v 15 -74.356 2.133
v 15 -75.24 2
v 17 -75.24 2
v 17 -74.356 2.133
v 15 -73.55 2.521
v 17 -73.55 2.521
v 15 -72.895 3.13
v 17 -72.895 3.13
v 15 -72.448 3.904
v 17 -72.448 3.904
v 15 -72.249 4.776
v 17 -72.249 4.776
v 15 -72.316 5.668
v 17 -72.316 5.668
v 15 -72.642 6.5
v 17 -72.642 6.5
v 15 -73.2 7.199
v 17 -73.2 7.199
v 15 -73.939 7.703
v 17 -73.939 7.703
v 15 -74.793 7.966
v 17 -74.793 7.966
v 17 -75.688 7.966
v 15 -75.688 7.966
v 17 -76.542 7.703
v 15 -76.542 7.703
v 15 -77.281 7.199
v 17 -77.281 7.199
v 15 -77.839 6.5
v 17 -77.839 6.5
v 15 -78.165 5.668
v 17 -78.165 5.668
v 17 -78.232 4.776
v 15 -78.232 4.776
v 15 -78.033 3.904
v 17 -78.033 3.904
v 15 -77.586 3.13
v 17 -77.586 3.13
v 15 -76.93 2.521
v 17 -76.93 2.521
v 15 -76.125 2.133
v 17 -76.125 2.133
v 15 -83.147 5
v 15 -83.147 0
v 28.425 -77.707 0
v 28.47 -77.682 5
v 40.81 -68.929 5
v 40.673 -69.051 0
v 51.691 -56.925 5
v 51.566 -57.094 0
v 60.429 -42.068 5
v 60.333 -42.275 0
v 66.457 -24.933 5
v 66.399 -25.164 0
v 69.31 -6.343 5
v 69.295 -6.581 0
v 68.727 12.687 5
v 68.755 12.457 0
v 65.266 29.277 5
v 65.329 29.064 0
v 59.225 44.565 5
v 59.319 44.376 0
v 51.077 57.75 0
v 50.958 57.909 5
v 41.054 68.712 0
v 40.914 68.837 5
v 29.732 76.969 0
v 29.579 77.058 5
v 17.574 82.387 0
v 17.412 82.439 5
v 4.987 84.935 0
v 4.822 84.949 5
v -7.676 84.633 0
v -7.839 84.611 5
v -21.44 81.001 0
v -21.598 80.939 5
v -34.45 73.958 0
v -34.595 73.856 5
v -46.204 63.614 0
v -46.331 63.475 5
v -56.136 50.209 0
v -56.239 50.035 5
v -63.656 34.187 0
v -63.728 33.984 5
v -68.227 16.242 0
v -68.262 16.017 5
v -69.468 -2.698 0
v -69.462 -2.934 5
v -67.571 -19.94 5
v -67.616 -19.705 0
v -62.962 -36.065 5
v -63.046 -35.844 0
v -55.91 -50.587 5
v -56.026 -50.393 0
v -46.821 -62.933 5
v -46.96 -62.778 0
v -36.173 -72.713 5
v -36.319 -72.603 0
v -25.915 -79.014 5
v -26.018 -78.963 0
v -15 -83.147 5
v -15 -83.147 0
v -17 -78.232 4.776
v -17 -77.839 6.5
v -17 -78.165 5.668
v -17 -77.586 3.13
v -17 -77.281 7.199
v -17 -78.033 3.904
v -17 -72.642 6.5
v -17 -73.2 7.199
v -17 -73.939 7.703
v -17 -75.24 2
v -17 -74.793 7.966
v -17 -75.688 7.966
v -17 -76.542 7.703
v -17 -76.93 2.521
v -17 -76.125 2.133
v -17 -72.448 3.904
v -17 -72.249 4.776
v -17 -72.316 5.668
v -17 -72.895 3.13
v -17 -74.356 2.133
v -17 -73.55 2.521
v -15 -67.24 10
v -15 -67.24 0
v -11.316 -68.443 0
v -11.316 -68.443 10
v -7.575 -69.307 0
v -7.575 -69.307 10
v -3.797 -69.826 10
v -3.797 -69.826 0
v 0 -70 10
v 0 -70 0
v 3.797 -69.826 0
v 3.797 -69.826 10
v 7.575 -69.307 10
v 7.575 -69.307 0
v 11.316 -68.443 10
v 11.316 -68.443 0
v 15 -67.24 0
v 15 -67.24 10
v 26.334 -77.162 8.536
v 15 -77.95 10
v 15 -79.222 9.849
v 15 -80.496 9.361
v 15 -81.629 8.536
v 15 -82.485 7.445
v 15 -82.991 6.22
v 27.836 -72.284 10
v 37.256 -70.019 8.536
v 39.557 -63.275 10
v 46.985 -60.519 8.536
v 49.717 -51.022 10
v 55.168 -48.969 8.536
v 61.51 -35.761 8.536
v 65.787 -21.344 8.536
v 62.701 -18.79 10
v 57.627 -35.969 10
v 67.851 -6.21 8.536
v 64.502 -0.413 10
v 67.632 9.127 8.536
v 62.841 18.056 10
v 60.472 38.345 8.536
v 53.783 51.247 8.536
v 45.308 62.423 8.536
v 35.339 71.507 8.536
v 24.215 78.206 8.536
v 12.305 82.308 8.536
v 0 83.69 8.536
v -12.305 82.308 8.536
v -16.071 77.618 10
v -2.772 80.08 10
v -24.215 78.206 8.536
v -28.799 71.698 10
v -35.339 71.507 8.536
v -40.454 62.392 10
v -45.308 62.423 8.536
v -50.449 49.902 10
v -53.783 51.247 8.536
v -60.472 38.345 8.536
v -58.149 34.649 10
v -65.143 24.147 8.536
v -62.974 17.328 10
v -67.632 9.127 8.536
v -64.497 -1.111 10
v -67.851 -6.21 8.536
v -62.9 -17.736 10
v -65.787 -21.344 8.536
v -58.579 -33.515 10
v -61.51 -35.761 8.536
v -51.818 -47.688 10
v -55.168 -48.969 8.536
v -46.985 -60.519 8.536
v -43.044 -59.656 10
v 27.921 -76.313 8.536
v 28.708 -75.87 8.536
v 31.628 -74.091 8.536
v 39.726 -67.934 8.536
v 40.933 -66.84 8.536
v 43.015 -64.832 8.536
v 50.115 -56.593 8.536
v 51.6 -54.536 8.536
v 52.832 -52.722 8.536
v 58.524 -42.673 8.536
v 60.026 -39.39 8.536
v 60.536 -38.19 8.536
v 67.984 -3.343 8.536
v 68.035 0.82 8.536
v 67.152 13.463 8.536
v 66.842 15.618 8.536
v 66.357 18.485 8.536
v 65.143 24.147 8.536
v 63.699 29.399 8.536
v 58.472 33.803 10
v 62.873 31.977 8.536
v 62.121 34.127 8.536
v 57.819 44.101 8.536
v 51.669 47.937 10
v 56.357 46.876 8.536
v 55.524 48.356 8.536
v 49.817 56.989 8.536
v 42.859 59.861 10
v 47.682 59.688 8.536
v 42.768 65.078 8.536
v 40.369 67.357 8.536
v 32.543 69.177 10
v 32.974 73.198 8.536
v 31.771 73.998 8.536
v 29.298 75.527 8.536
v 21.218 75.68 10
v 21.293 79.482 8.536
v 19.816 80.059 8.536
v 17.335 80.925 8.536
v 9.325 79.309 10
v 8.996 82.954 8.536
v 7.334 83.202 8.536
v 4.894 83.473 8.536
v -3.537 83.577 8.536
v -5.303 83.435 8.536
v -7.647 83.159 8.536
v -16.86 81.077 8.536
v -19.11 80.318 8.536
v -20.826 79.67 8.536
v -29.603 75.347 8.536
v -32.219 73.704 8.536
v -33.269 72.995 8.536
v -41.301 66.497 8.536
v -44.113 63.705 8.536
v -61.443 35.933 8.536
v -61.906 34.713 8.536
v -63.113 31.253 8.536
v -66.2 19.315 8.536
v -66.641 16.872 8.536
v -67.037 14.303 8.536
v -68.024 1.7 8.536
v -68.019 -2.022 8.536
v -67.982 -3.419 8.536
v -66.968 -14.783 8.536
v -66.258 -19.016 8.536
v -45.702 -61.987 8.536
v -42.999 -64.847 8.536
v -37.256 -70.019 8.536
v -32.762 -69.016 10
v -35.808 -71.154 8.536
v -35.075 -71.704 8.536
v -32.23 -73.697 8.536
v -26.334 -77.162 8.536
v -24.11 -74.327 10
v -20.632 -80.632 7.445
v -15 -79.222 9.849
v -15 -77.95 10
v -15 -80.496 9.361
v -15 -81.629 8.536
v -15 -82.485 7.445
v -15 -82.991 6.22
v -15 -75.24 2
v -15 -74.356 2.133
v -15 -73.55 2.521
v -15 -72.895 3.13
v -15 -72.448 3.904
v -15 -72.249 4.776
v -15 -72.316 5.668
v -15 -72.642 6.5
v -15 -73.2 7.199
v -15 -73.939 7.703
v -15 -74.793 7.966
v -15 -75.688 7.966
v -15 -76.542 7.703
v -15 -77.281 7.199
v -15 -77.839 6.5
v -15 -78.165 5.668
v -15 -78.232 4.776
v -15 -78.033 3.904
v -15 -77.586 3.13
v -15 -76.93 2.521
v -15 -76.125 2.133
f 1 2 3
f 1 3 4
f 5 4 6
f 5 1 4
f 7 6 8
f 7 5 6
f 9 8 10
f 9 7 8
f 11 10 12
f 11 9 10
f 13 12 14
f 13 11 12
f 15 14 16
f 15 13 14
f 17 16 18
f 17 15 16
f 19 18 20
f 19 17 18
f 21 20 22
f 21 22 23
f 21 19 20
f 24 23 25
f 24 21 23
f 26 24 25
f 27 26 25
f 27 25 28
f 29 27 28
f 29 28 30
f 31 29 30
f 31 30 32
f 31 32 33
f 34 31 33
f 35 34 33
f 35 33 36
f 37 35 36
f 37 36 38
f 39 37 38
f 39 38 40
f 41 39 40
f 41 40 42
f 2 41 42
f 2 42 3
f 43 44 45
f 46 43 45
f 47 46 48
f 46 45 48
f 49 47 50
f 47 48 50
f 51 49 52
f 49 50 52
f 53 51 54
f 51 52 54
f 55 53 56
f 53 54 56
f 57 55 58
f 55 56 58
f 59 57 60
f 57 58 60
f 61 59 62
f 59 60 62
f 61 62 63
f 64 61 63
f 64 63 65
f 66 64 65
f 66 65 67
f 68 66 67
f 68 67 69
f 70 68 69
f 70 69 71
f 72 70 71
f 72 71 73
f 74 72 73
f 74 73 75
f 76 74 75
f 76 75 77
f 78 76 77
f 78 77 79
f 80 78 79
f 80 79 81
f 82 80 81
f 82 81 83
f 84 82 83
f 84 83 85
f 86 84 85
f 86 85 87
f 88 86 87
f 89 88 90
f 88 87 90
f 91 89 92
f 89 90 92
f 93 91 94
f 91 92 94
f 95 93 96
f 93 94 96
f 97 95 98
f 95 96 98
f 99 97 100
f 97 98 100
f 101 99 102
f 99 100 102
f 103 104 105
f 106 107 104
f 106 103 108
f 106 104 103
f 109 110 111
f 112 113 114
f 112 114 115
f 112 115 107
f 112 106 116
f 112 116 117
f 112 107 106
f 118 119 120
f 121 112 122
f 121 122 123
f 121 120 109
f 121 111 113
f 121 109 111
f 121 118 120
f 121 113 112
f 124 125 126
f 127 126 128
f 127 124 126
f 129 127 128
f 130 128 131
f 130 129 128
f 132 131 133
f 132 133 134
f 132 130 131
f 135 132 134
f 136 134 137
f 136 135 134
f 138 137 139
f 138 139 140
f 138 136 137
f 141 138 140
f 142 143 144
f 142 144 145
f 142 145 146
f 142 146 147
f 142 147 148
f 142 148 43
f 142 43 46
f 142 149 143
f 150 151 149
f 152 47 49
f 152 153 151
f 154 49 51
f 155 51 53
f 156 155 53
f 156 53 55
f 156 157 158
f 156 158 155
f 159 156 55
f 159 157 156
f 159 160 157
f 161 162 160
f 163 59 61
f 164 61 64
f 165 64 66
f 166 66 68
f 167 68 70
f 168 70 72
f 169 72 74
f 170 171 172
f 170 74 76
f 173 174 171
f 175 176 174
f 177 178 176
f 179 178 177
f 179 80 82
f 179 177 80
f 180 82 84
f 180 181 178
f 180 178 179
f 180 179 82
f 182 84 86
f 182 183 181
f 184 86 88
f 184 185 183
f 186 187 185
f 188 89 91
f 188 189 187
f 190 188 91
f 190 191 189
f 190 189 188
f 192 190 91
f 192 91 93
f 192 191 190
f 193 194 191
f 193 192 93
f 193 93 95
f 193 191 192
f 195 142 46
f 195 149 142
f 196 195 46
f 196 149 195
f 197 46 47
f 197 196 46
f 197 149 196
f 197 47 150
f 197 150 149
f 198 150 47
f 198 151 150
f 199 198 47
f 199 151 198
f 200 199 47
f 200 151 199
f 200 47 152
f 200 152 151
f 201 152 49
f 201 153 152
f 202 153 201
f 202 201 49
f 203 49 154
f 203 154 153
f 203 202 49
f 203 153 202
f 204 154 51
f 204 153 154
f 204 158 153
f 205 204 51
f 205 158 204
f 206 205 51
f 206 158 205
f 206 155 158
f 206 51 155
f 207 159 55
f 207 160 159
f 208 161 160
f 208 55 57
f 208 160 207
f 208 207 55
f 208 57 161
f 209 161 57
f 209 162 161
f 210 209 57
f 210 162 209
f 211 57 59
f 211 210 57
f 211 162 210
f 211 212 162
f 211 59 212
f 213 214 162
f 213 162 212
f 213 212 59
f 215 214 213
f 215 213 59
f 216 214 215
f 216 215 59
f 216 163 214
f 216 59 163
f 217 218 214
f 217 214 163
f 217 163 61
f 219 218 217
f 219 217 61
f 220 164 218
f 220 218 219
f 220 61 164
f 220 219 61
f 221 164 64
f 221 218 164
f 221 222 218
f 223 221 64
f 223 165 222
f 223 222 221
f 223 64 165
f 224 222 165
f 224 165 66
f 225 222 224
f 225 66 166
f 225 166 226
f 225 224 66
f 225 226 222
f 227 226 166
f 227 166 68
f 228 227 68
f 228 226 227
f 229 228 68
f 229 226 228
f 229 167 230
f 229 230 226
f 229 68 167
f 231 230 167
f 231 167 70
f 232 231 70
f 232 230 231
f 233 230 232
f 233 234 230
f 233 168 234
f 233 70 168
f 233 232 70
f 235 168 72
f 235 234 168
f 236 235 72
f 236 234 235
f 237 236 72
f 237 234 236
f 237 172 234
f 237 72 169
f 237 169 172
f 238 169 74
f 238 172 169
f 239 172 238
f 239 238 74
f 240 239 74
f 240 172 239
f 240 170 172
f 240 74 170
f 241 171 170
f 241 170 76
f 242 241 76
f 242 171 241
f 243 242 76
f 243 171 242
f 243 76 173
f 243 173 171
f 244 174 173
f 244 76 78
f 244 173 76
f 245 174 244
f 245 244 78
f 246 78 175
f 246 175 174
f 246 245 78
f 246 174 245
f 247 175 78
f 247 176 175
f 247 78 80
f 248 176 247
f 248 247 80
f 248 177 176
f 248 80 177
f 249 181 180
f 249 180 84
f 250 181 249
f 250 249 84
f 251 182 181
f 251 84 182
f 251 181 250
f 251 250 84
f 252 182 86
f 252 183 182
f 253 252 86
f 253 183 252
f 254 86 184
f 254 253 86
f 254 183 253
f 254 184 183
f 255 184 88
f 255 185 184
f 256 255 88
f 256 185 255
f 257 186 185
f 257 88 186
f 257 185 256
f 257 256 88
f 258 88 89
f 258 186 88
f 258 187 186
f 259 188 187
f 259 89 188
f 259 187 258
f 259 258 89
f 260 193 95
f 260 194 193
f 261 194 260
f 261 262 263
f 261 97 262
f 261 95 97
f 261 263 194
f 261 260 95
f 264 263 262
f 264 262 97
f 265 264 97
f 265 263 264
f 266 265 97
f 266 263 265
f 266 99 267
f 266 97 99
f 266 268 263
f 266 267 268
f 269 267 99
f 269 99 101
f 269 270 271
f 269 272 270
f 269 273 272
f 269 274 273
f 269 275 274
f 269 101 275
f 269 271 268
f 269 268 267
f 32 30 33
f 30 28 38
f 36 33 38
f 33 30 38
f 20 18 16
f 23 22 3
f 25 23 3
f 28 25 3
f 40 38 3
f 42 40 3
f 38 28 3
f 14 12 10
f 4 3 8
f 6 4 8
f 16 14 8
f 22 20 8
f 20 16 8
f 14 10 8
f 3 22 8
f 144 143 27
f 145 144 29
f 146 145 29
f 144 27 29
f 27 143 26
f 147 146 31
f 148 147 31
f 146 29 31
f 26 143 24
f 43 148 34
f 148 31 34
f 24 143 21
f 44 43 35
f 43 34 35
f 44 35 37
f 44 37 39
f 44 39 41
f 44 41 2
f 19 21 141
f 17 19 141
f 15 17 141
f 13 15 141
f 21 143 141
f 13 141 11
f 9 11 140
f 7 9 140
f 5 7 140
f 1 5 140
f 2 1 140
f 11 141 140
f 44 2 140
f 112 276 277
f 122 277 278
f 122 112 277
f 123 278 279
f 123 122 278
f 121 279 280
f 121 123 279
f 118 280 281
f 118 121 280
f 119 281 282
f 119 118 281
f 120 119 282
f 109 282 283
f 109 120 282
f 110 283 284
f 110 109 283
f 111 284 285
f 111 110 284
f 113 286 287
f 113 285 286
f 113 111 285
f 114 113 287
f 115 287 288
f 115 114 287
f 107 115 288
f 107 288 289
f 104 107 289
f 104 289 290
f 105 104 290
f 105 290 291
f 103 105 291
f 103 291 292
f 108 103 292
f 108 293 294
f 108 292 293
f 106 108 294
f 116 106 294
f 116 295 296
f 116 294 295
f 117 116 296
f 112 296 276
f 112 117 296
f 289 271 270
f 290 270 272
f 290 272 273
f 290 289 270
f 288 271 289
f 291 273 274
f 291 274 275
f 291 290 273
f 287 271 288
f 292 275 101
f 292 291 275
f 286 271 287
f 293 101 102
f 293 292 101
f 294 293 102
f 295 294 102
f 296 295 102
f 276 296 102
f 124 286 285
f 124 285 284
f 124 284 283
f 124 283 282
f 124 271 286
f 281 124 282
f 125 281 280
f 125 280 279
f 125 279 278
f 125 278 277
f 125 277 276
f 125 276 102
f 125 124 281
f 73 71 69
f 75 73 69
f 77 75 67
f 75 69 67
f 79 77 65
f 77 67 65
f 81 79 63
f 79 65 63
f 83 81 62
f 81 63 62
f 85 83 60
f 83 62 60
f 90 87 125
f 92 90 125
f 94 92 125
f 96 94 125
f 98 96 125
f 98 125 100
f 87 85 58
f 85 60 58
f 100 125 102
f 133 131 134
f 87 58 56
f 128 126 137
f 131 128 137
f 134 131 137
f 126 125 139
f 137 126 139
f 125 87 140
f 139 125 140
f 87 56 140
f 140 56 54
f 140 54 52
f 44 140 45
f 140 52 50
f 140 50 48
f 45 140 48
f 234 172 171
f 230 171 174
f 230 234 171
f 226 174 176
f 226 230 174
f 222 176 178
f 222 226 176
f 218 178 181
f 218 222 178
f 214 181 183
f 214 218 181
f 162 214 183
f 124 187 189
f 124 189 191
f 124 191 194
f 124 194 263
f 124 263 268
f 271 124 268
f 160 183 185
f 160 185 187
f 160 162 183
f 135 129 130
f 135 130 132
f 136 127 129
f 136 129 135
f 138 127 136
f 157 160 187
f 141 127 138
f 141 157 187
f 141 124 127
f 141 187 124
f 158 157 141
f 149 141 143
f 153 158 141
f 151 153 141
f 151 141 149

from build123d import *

# Parameters (mm, degrees)
SKETCH2_RX              = 85.154239152
SKETCH2_RY              = 69.502968375
SKETCH2_RX_2            = 70
SKETCH2_RY_2            = 53.954429773
BOSS_EXTRUDE2_DEPTH     = 10
SKETCH5_W               = 30
SKETCH5_H               = 10
CUT_EXTRUDE4_DEPTH      = 198
SKETCH7_RX              = 70
SKETCH7_RY              = 53.954429773
BOSS_EXTRUDE4_DEPTH     = 10
FILLET3_R               = 5
CUT_EXTRUDE5_DEPTH      = 32
CUT_EXTRUDE5_DEPTH_BACK = 2
SKETCH8_R               = 3


with BuildPart() as part:
    # Sketch2 → Boss-Extrude2 (new body)
    with BuildSketch(Plane.XY):
        with Locations(Location((0, 0), (0, 0, -90))):
            Ellipse(SKETCH2_RX, SKETCH2_RY)
        with Locations(Location((0, 0), (0, 0, -90))):
            Ellipse(SKETCH2_RX_2, SKETCH2_RY_2, mode=Mode.SUBTRACT)
    extrude(amount=BOSS_EXTRUDE2_DEPTH)

    # Sketch5 → Cut-Extrude4 (cut)
    with BuildSketch(Plane(origin=(0, 0, 0), x_dir=(1, 0, 0), z_dir=(0, 1, 0))):
        with Locations((0, -5)):
            Rectangle(SKETCH5_W, SKETCH5_H)
    extrude(amount=-CUT_EXTRUDE4_DEPTH, mode=Mode.SUBTRACT)

    # Sketch7 → Boss-Extrude4 (add)
    with BuildSketch(Plane.XY.offset(10)):
        with Locations(Location((0, 0), (0, 0, -90))):
            Ellipse(SKETCH7_RX, SKETCH7_RY)
    extrude(amount=-BOSS_EXTRUDE4_DEPTH)

    # Fillet3
    fillet3_edges = [part.edges().sort_by_distance(p)[0] for p in [
        (-0.004276398, 85.154238991, 10),
    ]]
    fillet(fillet3_edges, radius=FILLET3_R)

    # Sketch8 → Cut-Extrude5 (cut, two sides: drawn at the far end of the back side and taken through both)
    with BuildSketch(Plane(origin=(-15, 0, 0), x_dir=(0, 0, -1), z_dir=(1, 0, 0)).offset(-CUT_EXTRUDE5_DEPTH_BACK)):
        with Locations((-5, -75.24042417)):
            Circle(SKETCH8_R)
    extrude(amount=CUT_EXTRUDE5_DEPTH + CUT_EXTRUDE5_DEPTH_BACK, mode=Mode.SUBTRACT)


solid = part.part
